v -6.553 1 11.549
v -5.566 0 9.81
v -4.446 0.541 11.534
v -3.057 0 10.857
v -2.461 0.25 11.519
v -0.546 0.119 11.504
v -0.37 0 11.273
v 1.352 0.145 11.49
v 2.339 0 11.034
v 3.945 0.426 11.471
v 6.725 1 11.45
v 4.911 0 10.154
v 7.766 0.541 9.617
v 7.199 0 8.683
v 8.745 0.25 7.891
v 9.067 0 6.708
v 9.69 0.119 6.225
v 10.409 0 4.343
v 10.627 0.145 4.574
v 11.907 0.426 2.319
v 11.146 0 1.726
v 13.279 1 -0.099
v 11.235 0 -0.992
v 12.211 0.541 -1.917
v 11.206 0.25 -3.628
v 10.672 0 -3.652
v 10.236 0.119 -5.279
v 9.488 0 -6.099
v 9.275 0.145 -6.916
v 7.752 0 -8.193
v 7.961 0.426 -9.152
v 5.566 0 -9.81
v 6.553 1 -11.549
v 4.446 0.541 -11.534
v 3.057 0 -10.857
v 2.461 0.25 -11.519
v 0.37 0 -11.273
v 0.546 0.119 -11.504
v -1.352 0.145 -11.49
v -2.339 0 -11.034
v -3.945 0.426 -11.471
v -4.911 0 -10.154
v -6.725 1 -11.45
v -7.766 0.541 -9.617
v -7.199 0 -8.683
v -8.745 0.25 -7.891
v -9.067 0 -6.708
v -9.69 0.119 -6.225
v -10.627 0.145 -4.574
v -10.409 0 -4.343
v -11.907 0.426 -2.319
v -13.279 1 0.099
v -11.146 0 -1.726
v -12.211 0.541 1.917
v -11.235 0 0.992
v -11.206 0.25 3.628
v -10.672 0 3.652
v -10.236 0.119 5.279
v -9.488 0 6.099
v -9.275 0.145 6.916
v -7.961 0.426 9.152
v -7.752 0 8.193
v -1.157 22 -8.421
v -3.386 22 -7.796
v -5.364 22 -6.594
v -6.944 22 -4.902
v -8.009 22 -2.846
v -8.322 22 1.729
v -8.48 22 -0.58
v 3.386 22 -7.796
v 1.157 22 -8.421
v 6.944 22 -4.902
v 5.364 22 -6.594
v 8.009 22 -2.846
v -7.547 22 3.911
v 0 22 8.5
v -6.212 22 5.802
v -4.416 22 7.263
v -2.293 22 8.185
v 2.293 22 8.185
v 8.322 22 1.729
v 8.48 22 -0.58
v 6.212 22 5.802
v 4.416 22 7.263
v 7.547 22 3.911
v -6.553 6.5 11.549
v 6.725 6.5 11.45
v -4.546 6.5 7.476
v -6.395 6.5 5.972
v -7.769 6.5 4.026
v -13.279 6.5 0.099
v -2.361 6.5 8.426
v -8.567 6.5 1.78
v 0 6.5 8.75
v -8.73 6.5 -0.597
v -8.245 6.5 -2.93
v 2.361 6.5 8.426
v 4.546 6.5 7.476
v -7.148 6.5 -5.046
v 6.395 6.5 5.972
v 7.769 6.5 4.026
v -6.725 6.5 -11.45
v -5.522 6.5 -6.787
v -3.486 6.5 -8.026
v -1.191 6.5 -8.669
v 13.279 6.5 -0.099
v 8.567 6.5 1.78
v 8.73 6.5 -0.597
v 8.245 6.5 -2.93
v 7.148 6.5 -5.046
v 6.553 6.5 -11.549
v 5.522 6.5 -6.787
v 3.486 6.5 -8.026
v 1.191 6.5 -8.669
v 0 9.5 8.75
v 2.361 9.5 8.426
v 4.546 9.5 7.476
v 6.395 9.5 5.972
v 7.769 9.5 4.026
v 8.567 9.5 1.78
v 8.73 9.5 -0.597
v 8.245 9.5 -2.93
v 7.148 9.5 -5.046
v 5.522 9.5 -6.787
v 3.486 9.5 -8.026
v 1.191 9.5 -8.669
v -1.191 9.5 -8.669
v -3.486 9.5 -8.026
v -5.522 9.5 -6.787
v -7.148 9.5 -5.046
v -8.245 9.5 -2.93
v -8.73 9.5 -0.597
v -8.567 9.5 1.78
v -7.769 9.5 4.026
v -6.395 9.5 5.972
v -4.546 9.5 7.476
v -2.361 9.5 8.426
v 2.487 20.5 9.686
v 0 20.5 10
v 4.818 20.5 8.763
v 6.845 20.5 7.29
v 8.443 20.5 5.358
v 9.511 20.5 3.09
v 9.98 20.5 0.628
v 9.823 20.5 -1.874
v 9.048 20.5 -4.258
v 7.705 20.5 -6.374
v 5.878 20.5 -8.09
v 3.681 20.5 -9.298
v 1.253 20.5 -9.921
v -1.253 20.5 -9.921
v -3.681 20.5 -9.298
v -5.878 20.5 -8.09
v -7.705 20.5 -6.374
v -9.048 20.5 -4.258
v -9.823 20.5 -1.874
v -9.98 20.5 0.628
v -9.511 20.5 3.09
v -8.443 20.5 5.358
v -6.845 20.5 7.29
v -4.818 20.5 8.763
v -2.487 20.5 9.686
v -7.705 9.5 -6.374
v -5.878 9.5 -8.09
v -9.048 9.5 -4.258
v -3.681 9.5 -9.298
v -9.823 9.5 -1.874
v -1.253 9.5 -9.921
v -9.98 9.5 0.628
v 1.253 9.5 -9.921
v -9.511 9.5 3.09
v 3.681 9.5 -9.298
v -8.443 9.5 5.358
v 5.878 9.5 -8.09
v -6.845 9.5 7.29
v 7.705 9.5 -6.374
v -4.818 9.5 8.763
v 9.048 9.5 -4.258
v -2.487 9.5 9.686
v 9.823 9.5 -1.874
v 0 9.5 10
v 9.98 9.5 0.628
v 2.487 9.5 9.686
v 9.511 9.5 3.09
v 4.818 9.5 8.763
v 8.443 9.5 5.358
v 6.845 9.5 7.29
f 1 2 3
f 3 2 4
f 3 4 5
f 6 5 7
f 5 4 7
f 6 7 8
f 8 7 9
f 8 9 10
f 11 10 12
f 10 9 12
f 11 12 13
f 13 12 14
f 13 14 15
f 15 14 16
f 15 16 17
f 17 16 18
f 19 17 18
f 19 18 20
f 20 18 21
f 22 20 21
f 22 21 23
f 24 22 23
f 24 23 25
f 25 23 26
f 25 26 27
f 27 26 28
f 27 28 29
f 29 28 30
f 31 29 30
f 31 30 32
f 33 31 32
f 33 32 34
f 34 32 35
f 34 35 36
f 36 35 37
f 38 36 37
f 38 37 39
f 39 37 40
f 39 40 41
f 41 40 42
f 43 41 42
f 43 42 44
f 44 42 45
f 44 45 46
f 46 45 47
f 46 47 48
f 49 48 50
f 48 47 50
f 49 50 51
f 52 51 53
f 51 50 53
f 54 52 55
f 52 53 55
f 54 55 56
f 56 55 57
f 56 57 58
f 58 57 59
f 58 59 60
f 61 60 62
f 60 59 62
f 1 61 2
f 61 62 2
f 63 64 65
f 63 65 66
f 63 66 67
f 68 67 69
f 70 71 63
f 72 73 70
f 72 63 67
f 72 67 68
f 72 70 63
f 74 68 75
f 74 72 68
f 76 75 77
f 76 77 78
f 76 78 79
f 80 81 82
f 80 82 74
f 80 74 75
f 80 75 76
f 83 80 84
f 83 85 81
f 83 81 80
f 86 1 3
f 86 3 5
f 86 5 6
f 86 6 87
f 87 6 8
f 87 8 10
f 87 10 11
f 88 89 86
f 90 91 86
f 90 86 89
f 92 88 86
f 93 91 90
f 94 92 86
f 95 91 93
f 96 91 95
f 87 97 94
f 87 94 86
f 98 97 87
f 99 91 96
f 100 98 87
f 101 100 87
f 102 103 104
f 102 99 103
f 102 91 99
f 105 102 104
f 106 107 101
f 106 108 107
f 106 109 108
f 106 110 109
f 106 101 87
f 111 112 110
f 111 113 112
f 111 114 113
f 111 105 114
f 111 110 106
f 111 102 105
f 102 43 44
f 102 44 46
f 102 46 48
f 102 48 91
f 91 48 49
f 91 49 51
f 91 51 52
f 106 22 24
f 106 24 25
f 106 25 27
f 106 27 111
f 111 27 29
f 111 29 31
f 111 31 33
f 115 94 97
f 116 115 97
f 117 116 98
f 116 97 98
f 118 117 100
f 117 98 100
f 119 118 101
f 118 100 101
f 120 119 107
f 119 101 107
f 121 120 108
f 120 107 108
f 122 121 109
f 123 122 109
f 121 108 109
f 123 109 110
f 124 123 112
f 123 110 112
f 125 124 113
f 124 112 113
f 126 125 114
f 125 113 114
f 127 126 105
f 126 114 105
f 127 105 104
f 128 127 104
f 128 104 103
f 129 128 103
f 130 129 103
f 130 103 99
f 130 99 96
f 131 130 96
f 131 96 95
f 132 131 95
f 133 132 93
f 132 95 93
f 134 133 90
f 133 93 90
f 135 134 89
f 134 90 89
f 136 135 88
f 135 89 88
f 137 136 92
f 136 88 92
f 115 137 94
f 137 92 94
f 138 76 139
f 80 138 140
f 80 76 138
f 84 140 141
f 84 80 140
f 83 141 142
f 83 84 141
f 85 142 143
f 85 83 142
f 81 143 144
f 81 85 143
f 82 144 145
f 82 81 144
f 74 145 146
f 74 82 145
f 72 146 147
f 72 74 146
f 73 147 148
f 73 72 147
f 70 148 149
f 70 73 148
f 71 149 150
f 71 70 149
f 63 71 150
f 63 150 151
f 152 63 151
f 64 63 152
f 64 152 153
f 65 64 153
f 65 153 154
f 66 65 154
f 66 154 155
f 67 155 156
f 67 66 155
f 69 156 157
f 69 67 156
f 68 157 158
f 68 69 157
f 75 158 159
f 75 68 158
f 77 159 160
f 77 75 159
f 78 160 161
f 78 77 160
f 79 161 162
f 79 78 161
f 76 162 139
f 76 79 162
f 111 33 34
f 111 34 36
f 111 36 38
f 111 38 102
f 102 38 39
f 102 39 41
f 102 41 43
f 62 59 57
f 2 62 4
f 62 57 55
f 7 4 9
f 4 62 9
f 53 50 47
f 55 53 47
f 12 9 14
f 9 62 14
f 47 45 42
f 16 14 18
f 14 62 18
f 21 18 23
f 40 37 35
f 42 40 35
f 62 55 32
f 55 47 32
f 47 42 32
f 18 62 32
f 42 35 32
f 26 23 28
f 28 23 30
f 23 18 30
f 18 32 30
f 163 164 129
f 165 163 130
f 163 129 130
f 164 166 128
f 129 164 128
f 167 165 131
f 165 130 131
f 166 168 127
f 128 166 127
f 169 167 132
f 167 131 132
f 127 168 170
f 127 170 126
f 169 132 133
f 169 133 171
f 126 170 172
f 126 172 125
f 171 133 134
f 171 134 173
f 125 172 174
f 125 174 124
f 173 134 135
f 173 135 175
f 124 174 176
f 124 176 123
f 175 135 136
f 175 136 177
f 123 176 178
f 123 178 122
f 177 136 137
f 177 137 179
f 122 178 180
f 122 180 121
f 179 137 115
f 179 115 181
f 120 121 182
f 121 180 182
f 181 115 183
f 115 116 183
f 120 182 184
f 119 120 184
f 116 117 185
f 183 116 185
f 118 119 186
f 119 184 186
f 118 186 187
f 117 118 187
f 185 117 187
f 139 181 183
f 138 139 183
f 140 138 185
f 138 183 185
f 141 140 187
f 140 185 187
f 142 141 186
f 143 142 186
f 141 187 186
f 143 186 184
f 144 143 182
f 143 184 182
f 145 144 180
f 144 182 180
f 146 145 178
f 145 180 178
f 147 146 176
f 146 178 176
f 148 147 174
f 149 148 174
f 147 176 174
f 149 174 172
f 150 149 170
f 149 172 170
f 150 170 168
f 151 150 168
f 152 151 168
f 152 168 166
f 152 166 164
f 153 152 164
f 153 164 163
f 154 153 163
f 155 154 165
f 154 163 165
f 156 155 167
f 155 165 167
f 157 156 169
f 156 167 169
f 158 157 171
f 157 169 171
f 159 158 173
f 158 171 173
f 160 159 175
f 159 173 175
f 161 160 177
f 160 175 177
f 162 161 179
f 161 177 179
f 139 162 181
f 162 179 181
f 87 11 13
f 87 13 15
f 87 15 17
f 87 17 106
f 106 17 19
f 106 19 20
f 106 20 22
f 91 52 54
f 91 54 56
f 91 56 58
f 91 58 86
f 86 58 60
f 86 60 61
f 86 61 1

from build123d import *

# Parameters (mm, degrees)
EXTRUDE_1_DEPTH = 6.5
SKETCH_2_R      = 8.75
EXTRUDE_2_DEPTH = 3
SKETCH_3_R      = 10
EXTRUDE_3_DEPTH = 12.5
CHAMFER_1_SIZE  = 1.5


with BuildPart() as part:
    # 草图1 → 凸台-拉伸1 (new body)
    with BuildSketch(Plane(origin=(0, 0, 0), x_dir=(1, 0, 0), z_dir=(0, 1, 0))):
        Polygon((6.553289027, 11.549360859), (-6.725395388, 11.449995205), (-13.278684415, -0.099365654), (-6.553289027, -11.549360859), (6.725395388, -11.449995205), (13.278684415, 0.099365654), align=None)
    extrude(amount=EXTRUDE_1_DEPTH)

    # 草图2 → 凸台-拉伸2 (add)
    with BuildSketch(Plane(origin=(0, 6.5, 0), x_dir=(1, 0, 0), z_dir=(0, 1, 0))):
        with Locations(Location((0, 0, 0), (0, 0, 270))):
            Circle(SKETCH_2_R)
    extrude(amount=EXTRUDE_2_DEPTH)

    # 草图3 → 凸台-拉伸3 (add)
    with BuildSketch(Plane(origin=(0, 9.5, 0), x_dir=(1, 0, 0), z_dir=(0, 1, 0))):
        with Locations(Location((0, 0, 0), (0, 0, 270))):
            Circle(SKETCH_3_R)
    extrude(amount=EXTRUDE_3_DEPTH)

    # 倒角1
    chamfer_1_edges = [part.edges().sort_by_distance(p)[0] for p in [
        (0, 22, -10),
    ]]
    chamfer(chamfer_1_edges, length=CHAMFER_1_SIZE)

    # 草图5 → 切除-旋转3 (revolve, cut)
    with BuildSketch(Plane(origin=(0, 0, 0), x_dir=(0.49350563267132574, 0, -0.8697426001534446), z_dir=(0.8697426001534445, 0, 0.4935056326713257)), mode=Mode.PRIVATE) as cut_revolve_3_sk:
        Polygon((13.279056191, 1), (11.279056191, 0), (13.279056191, 0), align=None)
    revolve(cut_revolve_3_sk.sketch.rotate(Axis((0, -1000, 0), (0, 1, 0)), 180.000000003), axis=Axis((0, -1000, 0), (0, 1, 0)), mode=Mode.SUBTRACT)


solid = part.part
